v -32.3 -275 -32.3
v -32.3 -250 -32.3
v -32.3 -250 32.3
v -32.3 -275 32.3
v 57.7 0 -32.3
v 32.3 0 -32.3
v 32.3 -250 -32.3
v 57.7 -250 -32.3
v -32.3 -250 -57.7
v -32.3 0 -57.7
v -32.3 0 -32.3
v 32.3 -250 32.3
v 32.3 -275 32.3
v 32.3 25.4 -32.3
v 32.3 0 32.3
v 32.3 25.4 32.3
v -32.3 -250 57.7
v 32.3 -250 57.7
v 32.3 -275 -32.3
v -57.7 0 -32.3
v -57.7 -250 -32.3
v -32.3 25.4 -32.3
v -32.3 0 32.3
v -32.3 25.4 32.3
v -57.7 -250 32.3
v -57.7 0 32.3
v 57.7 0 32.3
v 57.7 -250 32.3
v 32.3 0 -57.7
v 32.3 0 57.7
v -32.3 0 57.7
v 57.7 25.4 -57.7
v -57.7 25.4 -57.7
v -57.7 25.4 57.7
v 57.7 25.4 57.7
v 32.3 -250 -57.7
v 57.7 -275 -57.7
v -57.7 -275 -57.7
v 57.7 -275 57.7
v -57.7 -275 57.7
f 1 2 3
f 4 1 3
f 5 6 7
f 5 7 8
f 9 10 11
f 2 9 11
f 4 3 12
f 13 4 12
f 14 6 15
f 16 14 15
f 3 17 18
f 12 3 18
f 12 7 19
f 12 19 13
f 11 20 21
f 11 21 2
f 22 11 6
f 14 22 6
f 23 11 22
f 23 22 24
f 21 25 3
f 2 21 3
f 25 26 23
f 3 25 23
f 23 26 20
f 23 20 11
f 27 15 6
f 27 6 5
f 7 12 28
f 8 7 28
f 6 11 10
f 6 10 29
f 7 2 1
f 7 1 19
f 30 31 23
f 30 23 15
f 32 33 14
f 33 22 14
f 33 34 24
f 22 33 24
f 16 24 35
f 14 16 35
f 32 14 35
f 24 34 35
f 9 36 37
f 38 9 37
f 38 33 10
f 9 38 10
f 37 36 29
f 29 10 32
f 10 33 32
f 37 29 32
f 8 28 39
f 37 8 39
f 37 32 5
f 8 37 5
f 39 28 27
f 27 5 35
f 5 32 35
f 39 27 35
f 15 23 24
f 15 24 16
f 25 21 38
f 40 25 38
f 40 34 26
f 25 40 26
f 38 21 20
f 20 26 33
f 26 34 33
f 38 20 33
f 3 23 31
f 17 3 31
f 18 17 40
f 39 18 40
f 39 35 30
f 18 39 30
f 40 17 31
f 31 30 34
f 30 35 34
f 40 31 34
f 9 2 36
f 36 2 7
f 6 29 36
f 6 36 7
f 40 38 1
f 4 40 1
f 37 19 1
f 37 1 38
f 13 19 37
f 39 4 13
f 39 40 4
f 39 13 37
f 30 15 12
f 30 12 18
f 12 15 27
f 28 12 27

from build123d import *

# Parameters (mm, degrees)
F1_W     = 115.4
F1_H     = 115.4
F1_W_2   = 64.6
F1_H_2   = 64.6
F2_DEPTH = 25.4
F0_W     = 25.4
F0_H     = 25.4
F3_DEPTH = 250
F4_W     = 25.4
F4_H     = 25.4
F4_W_2   = 64.6
F4_H_2   = 64.6
F5_DEPTH = 25


with BuildPart() as f2:
    # F1 (on Front) → F2 (new body)
    with BuildSketch(Plane.XZ):
        Rectangle(F1_W, F1_H)
        Rectangle(F1_W_2, F1_H_2, mode=Mode.SUBTRACT)
    extrude(amount=-F2_DEPTH)

    # F0 (on Front) → F3 (join)
    with BuildSketch(Plane.XZ):
        with Locations((45, 45)):
            Rectangle(F0_W, F0_H)
        with Locations((-45, 45)):
            Rectangle(F0_W, F0_H)
        with Locations((-45, -45)):
            Rectangle(F0_W, F0_H)
        with Locations((45, -45)):
            Rectangle(F0_W, F0_H)
    extrude(amount=F3_DEPTH)

    # F4 (on face) → F5 (join)
    with BuildSketch(Plane.XZ.offset(250)):
        with Locations((-45, 45)):
            Rectangle(F4_W, F4_H)
        Polygon((57.7, 57.7), (-32.3, 57.7), (-32.3, 32.3), (-57.7, 32.3), (-57.7, -57.7), (57.7, -57.7), align=None)
        Rectangle(F4_W_2, F4_H_2, mode=Mode.SUBTRACT)
    extrude(amount=F5_DEPTH)


solid = f2.part
